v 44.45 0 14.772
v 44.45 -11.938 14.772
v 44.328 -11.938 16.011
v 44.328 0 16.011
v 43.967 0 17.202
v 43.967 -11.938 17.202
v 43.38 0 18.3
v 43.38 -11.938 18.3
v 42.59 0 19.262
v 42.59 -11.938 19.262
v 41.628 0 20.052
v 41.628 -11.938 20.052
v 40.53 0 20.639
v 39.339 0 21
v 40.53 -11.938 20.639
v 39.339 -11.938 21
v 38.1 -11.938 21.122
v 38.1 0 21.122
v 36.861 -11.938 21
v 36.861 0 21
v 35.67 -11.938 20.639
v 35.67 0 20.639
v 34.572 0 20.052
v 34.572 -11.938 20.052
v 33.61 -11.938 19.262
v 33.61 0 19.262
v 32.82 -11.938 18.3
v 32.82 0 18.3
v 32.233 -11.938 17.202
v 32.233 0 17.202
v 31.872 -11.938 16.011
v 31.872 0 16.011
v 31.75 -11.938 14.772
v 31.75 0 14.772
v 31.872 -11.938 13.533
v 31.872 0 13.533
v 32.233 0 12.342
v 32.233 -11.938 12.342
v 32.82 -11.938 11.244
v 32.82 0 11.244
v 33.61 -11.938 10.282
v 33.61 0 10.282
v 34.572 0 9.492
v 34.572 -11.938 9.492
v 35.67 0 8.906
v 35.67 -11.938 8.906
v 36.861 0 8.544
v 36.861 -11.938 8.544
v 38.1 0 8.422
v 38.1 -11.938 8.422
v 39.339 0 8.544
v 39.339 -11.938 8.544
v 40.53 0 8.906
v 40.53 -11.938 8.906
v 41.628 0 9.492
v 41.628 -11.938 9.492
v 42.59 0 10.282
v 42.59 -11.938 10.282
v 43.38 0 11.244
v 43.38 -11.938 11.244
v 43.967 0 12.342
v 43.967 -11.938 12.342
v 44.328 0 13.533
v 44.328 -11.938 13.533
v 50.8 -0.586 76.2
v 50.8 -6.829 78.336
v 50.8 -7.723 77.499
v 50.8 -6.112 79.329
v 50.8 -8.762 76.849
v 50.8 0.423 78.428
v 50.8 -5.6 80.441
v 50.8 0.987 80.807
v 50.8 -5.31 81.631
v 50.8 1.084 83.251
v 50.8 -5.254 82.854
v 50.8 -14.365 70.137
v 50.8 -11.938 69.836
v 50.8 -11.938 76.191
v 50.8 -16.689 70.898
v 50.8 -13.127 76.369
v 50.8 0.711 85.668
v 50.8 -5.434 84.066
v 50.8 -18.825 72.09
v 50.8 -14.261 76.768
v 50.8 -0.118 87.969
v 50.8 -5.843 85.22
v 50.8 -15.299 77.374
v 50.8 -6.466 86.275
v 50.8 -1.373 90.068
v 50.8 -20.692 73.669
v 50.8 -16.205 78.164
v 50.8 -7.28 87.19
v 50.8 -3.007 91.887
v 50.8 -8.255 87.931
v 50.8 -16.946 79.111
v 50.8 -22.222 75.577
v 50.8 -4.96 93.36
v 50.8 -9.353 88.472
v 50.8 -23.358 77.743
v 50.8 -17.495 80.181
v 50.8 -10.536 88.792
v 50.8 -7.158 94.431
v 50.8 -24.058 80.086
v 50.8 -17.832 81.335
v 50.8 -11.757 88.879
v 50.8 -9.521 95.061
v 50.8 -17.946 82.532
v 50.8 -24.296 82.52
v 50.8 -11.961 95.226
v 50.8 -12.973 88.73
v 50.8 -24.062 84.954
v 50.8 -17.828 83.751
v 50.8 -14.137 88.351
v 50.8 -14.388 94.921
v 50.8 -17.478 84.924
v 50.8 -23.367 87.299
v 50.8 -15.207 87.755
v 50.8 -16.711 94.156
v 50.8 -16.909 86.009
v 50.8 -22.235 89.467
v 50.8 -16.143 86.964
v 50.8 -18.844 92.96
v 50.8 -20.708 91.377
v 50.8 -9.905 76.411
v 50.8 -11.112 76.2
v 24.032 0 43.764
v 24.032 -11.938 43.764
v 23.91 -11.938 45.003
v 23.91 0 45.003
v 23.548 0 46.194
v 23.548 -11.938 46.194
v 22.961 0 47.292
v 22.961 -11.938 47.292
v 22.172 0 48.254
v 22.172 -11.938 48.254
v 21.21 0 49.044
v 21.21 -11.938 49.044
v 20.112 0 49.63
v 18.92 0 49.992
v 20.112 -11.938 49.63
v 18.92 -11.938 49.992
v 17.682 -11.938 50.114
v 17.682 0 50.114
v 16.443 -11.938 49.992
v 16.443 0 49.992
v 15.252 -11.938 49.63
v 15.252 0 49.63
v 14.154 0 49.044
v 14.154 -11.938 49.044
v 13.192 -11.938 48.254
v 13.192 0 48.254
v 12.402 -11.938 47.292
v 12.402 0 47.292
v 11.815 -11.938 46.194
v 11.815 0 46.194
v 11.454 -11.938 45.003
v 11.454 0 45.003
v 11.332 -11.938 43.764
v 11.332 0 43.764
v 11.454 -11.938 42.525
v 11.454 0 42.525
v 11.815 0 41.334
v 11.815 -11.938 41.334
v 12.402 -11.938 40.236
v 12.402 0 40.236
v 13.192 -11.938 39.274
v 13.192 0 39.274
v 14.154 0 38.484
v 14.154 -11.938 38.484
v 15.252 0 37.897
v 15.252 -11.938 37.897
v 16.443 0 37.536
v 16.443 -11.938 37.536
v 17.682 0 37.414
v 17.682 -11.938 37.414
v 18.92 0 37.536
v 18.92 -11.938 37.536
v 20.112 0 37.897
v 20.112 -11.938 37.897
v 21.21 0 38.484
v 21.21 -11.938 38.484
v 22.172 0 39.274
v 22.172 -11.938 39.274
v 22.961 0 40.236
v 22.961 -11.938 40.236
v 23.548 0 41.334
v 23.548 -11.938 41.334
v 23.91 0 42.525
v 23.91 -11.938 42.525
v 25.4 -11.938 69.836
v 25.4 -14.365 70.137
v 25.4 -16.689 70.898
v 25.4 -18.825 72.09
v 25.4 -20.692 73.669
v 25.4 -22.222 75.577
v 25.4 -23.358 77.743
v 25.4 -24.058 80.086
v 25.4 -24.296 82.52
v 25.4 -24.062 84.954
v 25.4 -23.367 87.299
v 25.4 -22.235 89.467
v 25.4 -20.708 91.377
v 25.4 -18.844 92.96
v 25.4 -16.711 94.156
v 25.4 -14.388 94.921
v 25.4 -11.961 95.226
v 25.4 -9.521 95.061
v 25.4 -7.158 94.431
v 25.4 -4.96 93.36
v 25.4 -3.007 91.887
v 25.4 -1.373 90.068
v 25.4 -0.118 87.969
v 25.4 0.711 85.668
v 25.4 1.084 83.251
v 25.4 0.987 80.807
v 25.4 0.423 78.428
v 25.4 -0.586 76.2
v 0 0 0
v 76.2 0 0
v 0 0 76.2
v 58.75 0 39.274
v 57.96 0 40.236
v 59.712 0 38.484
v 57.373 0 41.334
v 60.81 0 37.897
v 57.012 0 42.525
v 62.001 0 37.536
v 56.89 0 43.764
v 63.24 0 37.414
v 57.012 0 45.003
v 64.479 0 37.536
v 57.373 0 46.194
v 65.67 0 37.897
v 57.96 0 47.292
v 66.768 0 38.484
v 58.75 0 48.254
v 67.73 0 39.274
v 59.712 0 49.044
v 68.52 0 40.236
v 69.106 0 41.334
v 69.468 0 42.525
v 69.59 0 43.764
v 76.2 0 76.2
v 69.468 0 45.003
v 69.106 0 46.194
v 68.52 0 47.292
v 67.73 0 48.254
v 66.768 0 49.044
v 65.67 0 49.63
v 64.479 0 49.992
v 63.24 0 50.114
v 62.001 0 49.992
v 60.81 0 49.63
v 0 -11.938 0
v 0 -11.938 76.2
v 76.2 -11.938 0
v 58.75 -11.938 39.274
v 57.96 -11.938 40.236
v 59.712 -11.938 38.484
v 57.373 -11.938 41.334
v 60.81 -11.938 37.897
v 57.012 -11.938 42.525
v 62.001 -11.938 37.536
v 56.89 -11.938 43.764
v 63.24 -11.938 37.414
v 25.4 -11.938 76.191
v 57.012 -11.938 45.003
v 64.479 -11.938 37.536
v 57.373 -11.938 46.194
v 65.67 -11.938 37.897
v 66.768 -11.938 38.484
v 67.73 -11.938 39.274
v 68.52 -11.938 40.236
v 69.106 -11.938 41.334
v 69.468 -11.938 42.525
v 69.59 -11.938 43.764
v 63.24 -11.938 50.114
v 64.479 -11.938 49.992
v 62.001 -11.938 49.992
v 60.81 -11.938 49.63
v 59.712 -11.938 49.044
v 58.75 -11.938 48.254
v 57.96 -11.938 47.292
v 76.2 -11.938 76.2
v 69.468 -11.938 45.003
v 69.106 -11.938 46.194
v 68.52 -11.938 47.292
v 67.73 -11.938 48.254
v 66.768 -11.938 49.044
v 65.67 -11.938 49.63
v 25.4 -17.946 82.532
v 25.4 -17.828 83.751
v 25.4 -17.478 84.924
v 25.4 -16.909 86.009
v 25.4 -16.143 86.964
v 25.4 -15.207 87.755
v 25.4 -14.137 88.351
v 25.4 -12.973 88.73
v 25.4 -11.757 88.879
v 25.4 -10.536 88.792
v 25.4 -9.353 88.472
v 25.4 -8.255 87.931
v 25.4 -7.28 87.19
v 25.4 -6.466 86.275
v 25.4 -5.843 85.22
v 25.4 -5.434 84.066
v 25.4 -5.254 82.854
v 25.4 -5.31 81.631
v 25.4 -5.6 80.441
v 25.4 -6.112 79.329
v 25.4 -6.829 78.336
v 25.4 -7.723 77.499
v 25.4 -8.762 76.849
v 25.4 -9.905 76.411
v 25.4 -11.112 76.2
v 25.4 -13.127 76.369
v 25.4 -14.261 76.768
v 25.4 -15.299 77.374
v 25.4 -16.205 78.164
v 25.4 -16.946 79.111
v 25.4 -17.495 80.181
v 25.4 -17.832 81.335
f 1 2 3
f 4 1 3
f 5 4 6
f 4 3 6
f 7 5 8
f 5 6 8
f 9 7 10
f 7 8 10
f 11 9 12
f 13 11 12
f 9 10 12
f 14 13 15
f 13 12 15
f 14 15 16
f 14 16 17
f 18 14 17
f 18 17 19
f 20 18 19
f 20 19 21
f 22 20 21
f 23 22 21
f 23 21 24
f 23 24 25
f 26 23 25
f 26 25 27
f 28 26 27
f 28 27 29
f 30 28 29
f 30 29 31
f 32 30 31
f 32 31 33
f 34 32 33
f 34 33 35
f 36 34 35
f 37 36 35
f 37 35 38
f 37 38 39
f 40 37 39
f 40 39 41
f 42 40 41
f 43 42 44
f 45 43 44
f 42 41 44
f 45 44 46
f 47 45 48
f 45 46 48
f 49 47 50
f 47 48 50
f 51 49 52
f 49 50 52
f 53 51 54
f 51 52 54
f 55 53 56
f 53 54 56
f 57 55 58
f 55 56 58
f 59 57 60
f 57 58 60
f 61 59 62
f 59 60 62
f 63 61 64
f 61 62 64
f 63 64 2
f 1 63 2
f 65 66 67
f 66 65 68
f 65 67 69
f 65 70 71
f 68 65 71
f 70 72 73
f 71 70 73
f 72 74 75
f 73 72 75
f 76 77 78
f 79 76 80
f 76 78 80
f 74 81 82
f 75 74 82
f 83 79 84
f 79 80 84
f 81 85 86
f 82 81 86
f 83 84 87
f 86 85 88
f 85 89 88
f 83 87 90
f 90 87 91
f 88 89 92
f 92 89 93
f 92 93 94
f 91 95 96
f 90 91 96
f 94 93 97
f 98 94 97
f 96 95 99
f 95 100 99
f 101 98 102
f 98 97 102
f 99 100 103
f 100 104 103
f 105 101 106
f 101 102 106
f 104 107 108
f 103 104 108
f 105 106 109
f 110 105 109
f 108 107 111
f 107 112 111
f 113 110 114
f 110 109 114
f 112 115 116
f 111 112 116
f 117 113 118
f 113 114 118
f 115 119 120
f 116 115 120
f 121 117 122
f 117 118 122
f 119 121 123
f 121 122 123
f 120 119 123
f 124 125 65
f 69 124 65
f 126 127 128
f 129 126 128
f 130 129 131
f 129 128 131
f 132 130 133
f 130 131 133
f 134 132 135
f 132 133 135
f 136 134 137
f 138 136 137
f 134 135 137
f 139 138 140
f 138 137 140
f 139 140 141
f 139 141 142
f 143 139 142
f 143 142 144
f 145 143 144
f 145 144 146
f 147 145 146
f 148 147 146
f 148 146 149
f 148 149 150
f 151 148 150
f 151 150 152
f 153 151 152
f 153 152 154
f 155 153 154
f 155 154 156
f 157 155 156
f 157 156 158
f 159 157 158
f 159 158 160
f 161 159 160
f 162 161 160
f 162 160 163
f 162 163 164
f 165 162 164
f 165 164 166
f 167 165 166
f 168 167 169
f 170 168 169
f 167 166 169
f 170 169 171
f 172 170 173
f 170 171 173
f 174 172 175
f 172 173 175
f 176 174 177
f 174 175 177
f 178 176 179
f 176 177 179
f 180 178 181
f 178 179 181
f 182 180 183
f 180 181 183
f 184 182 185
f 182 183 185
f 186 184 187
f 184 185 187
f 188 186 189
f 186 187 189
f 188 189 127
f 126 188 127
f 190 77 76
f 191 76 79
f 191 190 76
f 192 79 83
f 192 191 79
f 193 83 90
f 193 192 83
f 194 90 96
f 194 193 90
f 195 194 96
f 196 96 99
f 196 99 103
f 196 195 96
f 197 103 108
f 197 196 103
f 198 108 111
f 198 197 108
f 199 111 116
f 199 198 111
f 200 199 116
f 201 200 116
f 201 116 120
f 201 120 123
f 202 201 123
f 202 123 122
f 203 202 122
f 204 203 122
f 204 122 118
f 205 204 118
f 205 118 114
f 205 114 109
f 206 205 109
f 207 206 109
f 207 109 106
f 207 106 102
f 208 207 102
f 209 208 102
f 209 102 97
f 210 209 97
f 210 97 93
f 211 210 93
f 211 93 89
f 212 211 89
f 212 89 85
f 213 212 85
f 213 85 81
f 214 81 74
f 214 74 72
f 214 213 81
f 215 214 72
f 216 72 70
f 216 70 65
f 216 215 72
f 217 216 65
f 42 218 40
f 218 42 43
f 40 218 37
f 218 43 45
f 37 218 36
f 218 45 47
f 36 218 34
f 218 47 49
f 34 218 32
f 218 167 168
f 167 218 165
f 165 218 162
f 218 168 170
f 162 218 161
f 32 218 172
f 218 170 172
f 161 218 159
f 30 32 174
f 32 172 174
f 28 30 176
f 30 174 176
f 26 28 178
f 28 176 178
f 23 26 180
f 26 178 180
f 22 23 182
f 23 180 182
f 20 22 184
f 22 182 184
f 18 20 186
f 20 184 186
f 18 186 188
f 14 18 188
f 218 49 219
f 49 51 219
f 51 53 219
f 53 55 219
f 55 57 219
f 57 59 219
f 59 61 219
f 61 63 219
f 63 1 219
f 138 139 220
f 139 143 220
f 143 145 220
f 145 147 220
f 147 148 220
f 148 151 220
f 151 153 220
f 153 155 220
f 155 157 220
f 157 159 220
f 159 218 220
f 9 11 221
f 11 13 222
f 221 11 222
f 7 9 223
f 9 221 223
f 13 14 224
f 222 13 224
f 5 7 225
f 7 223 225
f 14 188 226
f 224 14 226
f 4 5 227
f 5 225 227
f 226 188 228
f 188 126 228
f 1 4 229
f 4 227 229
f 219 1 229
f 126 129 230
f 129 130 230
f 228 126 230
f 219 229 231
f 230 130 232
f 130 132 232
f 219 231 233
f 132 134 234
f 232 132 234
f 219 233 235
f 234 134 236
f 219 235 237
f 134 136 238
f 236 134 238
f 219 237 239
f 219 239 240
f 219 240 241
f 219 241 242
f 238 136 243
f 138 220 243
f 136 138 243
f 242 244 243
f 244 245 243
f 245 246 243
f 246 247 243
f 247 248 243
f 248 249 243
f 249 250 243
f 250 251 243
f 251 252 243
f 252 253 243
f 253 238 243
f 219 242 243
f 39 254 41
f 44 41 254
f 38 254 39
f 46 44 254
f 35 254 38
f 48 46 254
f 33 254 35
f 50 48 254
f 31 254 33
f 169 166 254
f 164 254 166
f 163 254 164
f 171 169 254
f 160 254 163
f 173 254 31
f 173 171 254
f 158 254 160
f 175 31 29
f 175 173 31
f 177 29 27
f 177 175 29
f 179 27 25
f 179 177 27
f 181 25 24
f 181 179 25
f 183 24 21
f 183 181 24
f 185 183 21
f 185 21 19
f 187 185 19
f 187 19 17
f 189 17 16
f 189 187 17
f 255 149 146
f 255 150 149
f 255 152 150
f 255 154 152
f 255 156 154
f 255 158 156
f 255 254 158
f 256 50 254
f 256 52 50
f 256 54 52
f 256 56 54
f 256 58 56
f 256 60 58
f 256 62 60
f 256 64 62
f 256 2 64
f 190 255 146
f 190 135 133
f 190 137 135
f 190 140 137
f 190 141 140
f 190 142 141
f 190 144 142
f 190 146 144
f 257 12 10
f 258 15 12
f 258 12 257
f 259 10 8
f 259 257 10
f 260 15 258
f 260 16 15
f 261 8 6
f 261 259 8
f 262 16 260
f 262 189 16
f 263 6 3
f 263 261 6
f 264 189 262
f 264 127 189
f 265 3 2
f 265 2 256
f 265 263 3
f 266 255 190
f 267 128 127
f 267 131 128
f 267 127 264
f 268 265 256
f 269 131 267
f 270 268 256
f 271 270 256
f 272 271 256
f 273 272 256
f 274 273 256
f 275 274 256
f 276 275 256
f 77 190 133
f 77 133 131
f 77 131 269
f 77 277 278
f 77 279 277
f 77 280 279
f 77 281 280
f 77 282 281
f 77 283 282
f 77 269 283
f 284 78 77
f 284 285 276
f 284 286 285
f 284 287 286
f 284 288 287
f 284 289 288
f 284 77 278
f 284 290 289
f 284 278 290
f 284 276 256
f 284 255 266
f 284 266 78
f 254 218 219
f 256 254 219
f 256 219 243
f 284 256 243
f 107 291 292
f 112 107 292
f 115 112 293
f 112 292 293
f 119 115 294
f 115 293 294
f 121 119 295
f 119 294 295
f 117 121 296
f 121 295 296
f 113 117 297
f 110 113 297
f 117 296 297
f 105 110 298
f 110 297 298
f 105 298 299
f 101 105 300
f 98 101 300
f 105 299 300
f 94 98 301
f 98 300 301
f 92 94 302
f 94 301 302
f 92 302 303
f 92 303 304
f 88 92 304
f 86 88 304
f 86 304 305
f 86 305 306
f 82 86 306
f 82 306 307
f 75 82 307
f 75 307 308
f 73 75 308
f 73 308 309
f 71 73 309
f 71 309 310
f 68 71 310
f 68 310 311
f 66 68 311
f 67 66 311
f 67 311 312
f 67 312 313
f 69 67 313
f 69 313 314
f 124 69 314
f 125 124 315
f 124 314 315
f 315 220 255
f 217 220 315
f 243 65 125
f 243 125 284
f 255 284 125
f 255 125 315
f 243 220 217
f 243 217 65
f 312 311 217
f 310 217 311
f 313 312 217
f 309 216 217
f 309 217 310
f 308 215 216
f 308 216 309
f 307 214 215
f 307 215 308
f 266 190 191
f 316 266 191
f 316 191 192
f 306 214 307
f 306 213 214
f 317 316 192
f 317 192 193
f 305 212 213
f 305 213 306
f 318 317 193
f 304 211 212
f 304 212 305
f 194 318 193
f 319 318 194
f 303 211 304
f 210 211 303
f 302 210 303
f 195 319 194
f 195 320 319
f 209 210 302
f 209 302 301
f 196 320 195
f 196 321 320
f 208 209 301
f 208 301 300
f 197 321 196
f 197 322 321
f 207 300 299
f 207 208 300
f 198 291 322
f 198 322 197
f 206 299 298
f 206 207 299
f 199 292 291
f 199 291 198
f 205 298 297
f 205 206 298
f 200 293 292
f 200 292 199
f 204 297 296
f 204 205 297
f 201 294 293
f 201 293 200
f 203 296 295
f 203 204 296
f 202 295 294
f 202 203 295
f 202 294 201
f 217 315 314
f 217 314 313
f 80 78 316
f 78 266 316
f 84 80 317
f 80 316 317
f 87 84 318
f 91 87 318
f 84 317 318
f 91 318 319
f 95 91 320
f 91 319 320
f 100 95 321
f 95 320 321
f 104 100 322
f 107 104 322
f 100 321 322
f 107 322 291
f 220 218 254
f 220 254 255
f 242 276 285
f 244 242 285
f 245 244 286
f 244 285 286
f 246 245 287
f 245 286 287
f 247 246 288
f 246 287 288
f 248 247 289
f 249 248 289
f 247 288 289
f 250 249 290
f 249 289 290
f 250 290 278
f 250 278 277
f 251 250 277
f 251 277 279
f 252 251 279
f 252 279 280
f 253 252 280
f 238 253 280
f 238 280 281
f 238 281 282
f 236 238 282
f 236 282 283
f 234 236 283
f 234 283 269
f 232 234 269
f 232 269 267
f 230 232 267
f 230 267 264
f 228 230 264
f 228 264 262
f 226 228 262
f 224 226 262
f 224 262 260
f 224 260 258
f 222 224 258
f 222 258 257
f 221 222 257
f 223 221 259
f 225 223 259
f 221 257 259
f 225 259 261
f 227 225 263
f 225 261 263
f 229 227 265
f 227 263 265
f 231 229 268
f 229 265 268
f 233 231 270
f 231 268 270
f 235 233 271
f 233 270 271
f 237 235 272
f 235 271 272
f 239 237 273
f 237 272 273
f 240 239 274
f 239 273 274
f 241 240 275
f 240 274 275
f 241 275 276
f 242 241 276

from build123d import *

# Parameters (mm, degrees)
F0_W     = 76.2
F0_H     = 76.2
F1_DEPTH = 11.938
F3_START = -25.4
F2_R     = 12.7
F2_R_2   = 6.35
F3_DEPTH = 25.4
F4_R     = 6.35
F5_DEPTH = 25.4


with BuildPart() as f1:
    # F0 (on Front) → F1 (new body)
    with BuildSketch(Plane.XZ):
        with Locations((38.1, 38.1)):
            Rectangle(F0_W, F0_H)
    extrude(amount=F1_DEPTH)

    # F2 (on face) → F3 (join)
    with BuildSketch(Plane(origin=(0, 0, 0), x_dir=(0, -1, 0), z_dir=(-1, 0, 0)).offset(F3_START)):
        with Locations((11.5956608206, 82.5315266848)):
            Circle(F2_R)
        with Locations((11.5956608206, 82.5315266848)):
            Circle(F2_R_2, mode=Mode.SUBTRACT)
    extrude(amount=-F3_DEPTH)

    # F4 (on face) → F5 (cut)
    with BuildSketch(Plane.XZ.offset(11.938)):
        with Locations((38.1, 14.7721702233)):
            Circle(F4_R)
        with Locations((17.6816564053, 43.7637194991)):
            Circle(F4_R)
        with Locations((63.2398054004, 43.7637194991)):
            Circle(F4_R)
    extrude(amount=-F5_DEPTH, mode=Mode.SUBTRACT)


solid = f1.part
